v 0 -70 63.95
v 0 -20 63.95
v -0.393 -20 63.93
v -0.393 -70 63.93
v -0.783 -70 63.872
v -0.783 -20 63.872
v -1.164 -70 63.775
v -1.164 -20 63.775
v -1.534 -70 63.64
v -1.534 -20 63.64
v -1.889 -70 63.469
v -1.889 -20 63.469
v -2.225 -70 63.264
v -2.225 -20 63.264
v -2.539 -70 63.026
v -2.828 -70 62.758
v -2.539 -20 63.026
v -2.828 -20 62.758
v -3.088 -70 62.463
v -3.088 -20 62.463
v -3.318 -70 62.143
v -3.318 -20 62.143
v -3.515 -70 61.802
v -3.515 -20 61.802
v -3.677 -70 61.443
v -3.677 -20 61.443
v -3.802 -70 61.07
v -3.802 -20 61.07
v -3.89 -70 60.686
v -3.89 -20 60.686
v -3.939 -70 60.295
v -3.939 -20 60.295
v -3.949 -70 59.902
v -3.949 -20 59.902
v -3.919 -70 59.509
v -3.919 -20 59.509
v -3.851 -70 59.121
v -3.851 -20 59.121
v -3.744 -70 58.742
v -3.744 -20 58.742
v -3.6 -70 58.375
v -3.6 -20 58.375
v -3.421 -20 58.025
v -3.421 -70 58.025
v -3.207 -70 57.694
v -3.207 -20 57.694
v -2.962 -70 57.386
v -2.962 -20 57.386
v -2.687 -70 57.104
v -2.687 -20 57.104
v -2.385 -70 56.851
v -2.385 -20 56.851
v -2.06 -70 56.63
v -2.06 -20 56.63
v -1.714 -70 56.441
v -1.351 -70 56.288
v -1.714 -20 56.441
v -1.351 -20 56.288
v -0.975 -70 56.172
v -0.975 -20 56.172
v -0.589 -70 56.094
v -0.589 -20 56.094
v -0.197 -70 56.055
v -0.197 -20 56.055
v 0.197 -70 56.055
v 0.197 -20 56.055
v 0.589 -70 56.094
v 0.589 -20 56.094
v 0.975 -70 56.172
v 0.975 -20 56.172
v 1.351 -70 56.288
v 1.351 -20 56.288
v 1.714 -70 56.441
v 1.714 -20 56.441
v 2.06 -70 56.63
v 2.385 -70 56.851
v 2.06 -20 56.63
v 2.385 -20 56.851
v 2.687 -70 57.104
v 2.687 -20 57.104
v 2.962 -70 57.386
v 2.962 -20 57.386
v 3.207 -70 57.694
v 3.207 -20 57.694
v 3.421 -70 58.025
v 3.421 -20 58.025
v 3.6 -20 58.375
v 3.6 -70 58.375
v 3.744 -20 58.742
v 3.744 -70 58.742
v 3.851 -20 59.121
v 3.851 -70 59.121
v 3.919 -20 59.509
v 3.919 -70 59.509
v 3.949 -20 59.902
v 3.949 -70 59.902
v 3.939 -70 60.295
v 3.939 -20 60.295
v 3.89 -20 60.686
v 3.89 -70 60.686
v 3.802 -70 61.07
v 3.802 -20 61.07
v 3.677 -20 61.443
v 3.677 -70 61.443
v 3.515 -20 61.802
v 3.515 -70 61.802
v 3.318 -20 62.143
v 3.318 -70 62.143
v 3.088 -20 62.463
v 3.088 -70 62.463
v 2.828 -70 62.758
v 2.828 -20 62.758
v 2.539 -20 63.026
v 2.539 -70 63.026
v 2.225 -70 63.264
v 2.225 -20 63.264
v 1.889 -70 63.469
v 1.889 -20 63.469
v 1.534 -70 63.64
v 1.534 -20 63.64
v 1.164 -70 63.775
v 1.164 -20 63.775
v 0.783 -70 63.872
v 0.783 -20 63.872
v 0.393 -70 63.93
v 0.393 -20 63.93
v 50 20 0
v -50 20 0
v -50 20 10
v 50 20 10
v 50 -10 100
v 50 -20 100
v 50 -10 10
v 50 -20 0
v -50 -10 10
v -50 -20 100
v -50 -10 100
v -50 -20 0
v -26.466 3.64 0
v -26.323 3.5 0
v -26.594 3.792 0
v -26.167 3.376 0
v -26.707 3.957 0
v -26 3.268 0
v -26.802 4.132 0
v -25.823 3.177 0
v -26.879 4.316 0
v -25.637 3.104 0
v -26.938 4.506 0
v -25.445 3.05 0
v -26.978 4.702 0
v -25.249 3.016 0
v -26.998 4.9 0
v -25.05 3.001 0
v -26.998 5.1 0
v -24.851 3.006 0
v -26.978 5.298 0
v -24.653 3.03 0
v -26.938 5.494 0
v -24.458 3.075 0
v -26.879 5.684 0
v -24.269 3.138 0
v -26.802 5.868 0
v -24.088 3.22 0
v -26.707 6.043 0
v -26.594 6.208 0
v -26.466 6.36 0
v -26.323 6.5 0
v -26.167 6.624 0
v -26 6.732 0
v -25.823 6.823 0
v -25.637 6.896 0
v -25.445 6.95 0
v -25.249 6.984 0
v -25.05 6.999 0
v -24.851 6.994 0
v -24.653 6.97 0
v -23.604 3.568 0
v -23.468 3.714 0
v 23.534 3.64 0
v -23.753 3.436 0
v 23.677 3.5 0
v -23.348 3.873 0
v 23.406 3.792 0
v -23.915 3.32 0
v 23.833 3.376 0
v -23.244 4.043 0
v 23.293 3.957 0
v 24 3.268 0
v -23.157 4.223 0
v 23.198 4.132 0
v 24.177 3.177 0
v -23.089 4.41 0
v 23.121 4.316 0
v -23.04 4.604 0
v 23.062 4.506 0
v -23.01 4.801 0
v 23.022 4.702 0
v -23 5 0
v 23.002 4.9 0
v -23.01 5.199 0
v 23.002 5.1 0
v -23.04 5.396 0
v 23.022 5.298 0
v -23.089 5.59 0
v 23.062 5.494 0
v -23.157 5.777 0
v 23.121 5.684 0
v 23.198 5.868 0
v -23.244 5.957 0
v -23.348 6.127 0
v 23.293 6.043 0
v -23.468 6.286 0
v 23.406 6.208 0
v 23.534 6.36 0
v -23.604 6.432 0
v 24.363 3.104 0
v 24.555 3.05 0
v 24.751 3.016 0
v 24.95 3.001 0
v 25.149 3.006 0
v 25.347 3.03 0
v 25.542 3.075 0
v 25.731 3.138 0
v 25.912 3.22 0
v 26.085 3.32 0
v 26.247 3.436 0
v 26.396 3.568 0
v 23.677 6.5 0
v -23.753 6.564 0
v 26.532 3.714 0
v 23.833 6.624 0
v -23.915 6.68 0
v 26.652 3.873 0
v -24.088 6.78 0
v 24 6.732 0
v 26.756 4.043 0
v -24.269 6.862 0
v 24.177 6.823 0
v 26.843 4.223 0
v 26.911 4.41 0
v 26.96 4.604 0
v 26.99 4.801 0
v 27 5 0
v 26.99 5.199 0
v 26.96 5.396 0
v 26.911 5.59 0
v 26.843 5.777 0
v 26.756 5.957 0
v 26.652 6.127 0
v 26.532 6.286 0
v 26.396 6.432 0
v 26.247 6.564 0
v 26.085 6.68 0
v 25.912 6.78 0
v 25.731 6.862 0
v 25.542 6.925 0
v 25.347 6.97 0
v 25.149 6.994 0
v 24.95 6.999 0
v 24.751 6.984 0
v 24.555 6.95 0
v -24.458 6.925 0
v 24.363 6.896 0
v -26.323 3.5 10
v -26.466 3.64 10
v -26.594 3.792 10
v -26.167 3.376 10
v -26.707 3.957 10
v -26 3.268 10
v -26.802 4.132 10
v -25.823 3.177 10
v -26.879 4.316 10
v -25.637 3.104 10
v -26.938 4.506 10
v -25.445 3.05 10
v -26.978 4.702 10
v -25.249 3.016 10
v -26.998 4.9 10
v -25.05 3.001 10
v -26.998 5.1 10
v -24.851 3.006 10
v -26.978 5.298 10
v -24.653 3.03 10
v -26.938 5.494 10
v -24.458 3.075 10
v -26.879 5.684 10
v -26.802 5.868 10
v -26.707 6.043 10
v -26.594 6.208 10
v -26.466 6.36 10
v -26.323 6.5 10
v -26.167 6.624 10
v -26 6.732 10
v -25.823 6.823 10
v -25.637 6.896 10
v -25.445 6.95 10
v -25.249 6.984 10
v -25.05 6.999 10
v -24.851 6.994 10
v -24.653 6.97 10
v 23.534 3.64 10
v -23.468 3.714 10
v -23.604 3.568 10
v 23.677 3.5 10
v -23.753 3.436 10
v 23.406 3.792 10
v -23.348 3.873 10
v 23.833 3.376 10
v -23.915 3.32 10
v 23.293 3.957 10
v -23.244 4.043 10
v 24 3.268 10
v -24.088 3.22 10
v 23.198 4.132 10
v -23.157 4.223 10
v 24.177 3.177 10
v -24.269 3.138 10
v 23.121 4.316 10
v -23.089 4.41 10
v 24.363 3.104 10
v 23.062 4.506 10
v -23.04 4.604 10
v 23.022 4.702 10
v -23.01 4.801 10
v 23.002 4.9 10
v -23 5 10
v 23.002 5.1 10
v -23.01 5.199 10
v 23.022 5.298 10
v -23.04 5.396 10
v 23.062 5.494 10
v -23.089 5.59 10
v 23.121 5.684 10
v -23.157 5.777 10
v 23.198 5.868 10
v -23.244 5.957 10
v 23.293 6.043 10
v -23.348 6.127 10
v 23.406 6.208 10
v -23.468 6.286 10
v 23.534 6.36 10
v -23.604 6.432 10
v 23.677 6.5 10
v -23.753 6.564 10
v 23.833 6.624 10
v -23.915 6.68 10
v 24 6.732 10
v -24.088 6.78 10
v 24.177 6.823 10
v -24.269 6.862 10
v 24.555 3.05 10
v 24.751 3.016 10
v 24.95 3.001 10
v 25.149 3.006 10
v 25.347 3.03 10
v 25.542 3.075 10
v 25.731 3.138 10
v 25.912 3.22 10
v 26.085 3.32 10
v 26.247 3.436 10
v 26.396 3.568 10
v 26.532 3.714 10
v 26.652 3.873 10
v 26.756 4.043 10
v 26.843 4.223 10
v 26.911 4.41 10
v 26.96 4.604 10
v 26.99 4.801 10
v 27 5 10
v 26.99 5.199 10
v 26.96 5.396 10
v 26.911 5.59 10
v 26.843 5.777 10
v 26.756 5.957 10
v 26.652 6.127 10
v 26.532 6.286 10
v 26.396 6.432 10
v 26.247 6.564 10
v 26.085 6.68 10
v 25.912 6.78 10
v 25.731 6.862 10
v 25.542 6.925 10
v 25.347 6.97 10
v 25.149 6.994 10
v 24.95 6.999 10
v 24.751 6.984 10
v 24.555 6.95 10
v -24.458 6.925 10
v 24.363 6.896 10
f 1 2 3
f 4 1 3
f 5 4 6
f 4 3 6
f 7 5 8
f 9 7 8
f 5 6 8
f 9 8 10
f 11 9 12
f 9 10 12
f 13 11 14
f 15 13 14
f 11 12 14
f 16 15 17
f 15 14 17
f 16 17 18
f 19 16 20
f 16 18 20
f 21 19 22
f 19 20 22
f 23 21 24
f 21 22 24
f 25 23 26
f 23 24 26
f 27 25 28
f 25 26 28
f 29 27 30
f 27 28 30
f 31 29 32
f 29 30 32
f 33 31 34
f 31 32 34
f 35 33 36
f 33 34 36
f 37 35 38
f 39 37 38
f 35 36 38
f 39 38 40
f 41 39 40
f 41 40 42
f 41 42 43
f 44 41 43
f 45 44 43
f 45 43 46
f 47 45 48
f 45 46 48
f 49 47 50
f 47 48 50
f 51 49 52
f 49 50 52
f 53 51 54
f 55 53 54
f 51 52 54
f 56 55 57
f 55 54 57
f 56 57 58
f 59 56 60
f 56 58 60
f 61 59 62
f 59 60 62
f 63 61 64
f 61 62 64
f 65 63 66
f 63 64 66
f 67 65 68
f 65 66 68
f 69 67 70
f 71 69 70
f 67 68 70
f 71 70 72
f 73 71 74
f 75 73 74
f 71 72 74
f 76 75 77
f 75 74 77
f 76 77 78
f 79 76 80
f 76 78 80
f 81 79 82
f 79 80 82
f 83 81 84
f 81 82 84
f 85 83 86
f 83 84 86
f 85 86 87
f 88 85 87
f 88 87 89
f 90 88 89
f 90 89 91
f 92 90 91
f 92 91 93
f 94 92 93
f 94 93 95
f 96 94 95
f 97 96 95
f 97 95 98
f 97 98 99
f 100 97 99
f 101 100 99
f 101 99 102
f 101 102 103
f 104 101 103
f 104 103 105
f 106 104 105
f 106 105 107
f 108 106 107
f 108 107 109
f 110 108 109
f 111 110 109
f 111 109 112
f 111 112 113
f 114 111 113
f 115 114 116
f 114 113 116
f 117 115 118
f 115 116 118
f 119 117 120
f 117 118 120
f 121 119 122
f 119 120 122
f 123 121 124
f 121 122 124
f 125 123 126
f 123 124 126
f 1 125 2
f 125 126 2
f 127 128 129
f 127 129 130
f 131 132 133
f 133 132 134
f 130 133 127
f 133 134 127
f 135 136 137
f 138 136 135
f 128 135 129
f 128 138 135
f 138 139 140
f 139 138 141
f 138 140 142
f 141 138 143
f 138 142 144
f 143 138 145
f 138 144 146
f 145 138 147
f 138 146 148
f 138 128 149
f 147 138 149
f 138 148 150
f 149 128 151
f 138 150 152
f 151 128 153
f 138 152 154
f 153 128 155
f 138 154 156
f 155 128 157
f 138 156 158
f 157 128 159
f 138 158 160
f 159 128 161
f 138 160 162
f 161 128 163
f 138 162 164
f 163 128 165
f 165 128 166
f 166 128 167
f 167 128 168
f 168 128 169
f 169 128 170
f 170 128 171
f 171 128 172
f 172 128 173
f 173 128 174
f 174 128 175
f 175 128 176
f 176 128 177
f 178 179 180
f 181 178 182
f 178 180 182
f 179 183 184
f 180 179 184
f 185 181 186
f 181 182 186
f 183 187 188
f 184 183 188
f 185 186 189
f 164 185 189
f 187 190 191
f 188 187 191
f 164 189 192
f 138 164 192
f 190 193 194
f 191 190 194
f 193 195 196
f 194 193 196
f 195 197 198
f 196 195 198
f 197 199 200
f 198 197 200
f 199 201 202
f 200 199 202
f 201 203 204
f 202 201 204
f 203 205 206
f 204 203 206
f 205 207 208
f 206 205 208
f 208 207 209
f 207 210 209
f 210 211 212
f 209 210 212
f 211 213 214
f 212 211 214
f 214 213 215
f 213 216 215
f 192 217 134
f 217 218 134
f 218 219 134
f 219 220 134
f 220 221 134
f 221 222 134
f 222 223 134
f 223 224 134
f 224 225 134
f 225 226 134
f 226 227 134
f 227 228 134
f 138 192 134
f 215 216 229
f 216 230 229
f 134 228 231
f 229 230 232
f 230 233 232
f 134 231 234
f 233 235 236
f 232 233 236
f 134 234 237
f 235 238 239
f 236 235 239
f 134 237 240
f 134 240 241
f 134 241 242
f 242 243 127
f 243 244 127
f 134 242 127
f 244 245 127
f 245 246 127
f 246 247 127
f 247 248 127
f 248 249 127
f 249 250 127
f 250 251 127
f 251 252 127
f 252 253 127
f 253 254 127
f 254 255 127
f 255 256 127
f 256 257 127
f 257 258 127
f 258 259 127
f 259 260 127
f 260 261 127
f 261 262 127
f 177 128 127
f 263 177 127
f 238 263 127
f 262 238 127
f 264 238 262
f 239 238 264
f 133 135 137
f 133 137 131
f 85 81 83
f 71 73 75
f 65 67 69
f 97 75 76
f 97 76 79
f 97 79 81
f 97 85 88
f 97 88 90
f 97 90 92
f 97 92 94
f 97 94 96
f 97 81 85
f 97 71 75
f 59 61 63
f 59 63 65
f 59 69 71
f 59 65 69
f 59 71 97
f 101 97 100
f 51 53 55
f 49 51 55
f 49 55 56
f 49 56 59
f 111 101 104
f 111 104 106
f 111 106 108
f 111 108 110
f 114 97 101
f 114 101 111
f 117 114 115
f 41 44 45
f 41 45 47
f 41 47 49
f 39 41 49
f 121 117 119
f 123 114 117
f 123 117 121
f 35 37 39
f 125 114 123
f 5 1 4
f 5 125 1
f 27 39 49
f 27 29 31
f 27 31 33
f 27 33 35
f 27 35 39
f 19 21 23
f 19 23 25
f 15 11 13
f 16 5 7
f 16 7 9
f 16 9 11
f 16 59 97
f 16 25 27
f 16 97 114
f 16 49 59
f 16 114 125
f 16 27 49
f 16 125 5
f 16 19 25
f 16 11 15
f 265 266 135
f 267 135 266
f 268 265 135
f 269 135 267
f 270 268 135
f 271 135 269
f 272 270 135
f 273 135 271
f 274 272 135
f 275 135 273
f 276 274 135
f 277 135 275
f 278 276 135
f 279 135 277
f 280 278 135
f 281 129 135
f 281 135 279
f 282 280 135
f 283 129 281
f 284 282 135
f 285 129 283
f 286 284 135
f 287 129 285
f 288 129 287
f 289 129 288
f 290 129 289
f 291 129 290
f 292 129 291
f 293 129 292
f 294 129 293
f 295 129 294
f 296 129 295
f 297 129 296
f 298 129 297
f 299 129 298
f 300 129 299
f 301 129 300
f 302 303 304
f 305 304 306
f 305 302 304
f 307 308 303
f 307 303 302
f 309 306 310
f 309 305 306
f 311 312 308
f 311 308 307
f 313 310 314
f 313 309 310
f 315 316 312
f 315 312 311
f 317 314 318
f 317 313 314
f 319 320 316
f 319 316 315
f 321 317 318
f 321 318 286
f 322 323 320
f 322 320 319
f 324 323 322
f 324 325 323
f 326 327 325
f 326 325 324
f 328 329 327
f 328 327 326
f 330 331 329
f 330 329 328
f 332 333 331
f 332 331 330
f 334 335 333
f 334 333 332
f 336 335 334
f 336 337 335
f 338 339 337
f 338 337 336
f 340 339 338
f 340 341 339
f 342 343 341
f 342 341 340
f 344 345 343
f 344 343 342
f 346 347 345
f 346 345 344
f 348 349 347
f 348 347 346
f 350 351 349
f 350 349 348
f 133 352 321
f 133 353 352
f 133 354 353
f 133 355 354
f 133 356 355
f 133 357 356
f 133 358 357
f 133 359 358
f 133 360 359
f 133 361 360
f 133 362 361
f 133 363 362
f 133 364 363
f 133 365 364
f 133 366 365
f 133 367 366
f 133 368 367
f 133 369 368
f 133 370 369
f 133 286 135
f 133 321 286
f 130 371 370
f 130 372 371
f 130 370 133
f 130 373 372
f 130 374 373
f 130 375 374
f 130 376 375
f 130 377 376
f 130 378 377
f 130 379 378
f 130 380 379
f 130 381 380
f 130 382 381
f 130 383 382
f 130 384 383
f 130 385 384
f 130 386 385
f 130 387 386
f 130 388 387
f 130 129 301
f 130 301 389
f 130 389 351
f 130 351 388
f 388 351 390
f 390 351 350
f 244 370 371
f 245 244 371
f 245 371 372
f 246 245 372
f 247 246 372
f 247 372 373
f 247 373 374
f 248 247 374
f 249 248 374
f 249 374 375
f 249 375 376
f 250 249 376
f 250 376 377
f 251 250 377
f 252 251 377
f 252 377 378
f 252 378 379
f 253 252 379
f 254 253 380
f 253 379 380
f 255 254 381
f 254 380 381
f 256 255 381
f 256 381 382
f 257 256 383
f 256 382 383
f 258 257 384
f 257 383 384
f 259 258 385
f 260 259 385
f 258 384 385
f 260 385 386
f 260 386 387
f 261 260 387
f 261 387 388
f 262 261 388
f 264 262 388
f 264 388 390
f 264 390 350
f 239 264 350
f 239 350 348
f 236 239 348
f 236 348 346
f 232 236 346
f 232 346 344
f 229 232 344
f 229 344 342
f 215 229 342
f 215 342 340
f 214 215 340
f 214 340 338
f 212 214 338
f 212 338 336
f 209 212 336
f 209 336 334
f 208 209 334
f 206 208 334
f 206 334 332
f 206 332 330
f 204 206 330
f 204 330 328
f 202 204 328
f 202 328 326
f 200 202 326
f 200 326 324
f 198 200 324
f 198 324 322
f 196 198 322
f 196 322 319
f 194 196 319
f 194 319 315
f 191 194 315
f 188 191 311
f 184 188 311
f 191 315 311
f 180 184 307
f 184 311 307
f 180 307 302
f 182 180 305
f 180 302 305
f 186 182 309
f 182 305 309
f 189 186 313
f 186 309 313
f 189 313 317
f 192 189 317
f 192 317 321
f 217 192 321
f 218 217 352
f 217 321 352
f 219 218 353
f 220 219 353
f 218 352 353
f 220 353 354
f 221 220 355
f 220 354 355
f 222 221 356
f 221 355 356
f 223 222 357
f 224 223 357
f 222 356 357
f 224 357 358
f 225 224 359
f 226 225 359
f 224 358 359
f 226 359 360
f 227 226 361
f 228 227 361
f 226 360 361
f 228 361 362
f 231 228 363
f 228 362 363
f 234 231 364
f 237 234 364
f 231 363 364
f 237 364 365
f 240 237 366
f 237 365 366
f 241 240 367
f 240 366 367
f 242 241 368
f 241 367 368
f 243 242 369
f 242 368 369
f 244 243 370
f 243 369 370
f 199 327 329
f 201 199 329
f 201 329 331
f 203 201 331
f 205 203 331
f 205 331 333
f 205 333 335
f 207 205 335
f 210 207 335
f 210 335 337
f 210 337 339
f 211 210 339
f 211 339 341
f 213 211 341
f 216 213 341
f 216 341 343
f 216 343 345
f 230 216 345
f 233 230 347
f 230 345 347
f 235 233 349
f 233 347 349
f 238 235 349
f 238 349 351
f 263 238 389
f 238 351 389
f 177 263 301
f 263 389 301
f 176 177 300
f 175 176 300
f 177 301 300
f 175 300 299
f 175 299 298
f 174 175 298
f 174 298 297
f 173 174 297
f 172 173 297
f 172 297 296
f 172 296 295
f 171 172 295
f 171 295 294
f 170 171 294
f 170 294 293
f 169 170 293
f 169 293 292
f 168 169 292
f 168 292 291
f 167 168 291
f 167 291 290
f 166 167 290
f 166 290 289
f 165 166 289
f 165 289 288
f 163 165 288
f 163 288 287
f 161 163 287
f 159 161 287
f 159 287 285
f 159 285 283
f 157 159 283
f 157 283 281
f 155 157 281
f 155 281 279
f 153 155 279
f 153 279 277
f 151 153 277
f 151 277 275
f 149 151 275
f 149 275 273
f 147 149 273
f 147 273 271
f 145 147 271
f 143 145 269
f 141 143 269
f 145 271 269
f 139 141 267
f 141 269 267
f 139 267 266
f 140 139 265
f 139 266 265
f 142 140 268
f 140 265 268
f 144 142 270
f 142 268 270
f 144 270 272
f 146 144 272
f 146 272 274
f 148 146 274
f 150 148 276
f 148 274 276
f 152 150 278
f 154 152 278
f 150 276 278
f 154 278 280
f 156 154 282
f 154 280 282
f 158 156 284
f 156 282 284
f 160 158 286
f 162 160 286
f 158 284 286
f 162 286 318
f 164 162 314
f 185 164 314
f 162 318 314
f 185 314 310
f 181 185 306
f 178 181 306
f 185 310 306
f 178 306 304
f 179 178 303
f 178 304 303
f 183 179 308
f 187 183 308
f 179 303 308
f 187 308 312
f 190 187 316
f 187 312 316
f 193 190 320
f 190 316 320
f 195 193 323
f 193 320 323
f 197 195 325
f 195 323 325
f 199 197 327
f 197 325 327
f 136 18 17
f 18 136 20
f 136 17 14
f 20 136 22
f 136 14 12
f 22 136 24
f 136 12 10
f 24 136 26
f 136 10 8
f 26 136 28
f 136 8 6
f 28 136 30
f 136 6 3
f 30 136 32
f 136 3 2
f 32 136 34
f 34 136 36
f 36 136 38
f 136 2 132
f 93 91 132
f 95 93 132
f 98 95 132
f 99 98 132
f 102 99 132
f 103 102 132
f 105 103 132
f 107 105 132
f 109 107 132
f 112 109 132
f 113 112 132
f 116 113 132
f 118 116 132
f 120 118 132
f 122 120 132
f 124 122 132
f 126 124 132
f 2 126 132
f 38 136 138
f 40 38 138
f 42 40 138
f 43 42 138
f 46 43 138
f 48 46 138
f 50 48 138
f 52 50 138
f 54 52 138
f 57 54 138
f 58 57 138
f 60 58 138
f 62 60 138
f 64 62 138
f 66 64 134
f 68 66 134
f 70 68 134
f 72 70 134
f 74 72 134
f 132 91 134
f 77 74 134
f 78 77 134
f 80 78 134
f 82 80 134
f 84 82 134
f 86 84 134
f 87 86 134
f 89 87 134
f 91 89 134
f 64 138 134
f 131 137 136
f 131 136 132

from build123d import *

# Parameters (mm, degrees)
SKETCH1_W           = 100
SKETCH1_H           = 40
BOSS_EXTRUDE1_DEPTH = 10
SKETCH2_W           = 100
SKETCH2_H           = 10
BOSS_EXTRUDE2_DEPTH = 90
SKETCH3_R           = 3.95
BOSS_EXTRUDE3_DEPTH = 50
SKETCH4_R           = 2
CUT_EXTRUDE1_DEPTH  = 50


with BuildPart() as part:
    # Sketch1 → Boss-Extrude1 (new body)
    with BuildSketch(Plane.XY):
        Rectangle(SKETCH1_W, SKETCH1_H)
    extrude(amount=BOSS_EXTRUDE1_DEPTH)

    # Sketch2 → Boss-Extrude2 (add)
    with BuildSketch(Plane.XY.offset(10)):
        with Locations((0, -15)):
            Rectangle(SKETCH2_W, SKETCH2_H)
    extrude(amount=BOSS_EXTRUDE2_DEPTH)

    # Sketch3 → Boss-Extrude3 (add)
    with BuildSketch(Plane.XZ.offset(20)):
        with Locations(Location((0, 60, 0), (0, 0, 90))):
            Circle(SKETCH3_R)
    extrude(amount=BOSS_EXTRUDE3_DEPTH)

    # Sketch4 → Cut-Extrude1 (cut)
    with BuildSketch(Plane.XY.offset(10)):
        with Locations((-25, 5)):
            Circle(SKETCH4_R)
        with Locations((25, 5)):
            Circle(SKETCH4_R)
    extrude(amount=-CUT_EXTRUDE1_DEPTH, mode=Mode.SUBTRACT)


solid = part.part
